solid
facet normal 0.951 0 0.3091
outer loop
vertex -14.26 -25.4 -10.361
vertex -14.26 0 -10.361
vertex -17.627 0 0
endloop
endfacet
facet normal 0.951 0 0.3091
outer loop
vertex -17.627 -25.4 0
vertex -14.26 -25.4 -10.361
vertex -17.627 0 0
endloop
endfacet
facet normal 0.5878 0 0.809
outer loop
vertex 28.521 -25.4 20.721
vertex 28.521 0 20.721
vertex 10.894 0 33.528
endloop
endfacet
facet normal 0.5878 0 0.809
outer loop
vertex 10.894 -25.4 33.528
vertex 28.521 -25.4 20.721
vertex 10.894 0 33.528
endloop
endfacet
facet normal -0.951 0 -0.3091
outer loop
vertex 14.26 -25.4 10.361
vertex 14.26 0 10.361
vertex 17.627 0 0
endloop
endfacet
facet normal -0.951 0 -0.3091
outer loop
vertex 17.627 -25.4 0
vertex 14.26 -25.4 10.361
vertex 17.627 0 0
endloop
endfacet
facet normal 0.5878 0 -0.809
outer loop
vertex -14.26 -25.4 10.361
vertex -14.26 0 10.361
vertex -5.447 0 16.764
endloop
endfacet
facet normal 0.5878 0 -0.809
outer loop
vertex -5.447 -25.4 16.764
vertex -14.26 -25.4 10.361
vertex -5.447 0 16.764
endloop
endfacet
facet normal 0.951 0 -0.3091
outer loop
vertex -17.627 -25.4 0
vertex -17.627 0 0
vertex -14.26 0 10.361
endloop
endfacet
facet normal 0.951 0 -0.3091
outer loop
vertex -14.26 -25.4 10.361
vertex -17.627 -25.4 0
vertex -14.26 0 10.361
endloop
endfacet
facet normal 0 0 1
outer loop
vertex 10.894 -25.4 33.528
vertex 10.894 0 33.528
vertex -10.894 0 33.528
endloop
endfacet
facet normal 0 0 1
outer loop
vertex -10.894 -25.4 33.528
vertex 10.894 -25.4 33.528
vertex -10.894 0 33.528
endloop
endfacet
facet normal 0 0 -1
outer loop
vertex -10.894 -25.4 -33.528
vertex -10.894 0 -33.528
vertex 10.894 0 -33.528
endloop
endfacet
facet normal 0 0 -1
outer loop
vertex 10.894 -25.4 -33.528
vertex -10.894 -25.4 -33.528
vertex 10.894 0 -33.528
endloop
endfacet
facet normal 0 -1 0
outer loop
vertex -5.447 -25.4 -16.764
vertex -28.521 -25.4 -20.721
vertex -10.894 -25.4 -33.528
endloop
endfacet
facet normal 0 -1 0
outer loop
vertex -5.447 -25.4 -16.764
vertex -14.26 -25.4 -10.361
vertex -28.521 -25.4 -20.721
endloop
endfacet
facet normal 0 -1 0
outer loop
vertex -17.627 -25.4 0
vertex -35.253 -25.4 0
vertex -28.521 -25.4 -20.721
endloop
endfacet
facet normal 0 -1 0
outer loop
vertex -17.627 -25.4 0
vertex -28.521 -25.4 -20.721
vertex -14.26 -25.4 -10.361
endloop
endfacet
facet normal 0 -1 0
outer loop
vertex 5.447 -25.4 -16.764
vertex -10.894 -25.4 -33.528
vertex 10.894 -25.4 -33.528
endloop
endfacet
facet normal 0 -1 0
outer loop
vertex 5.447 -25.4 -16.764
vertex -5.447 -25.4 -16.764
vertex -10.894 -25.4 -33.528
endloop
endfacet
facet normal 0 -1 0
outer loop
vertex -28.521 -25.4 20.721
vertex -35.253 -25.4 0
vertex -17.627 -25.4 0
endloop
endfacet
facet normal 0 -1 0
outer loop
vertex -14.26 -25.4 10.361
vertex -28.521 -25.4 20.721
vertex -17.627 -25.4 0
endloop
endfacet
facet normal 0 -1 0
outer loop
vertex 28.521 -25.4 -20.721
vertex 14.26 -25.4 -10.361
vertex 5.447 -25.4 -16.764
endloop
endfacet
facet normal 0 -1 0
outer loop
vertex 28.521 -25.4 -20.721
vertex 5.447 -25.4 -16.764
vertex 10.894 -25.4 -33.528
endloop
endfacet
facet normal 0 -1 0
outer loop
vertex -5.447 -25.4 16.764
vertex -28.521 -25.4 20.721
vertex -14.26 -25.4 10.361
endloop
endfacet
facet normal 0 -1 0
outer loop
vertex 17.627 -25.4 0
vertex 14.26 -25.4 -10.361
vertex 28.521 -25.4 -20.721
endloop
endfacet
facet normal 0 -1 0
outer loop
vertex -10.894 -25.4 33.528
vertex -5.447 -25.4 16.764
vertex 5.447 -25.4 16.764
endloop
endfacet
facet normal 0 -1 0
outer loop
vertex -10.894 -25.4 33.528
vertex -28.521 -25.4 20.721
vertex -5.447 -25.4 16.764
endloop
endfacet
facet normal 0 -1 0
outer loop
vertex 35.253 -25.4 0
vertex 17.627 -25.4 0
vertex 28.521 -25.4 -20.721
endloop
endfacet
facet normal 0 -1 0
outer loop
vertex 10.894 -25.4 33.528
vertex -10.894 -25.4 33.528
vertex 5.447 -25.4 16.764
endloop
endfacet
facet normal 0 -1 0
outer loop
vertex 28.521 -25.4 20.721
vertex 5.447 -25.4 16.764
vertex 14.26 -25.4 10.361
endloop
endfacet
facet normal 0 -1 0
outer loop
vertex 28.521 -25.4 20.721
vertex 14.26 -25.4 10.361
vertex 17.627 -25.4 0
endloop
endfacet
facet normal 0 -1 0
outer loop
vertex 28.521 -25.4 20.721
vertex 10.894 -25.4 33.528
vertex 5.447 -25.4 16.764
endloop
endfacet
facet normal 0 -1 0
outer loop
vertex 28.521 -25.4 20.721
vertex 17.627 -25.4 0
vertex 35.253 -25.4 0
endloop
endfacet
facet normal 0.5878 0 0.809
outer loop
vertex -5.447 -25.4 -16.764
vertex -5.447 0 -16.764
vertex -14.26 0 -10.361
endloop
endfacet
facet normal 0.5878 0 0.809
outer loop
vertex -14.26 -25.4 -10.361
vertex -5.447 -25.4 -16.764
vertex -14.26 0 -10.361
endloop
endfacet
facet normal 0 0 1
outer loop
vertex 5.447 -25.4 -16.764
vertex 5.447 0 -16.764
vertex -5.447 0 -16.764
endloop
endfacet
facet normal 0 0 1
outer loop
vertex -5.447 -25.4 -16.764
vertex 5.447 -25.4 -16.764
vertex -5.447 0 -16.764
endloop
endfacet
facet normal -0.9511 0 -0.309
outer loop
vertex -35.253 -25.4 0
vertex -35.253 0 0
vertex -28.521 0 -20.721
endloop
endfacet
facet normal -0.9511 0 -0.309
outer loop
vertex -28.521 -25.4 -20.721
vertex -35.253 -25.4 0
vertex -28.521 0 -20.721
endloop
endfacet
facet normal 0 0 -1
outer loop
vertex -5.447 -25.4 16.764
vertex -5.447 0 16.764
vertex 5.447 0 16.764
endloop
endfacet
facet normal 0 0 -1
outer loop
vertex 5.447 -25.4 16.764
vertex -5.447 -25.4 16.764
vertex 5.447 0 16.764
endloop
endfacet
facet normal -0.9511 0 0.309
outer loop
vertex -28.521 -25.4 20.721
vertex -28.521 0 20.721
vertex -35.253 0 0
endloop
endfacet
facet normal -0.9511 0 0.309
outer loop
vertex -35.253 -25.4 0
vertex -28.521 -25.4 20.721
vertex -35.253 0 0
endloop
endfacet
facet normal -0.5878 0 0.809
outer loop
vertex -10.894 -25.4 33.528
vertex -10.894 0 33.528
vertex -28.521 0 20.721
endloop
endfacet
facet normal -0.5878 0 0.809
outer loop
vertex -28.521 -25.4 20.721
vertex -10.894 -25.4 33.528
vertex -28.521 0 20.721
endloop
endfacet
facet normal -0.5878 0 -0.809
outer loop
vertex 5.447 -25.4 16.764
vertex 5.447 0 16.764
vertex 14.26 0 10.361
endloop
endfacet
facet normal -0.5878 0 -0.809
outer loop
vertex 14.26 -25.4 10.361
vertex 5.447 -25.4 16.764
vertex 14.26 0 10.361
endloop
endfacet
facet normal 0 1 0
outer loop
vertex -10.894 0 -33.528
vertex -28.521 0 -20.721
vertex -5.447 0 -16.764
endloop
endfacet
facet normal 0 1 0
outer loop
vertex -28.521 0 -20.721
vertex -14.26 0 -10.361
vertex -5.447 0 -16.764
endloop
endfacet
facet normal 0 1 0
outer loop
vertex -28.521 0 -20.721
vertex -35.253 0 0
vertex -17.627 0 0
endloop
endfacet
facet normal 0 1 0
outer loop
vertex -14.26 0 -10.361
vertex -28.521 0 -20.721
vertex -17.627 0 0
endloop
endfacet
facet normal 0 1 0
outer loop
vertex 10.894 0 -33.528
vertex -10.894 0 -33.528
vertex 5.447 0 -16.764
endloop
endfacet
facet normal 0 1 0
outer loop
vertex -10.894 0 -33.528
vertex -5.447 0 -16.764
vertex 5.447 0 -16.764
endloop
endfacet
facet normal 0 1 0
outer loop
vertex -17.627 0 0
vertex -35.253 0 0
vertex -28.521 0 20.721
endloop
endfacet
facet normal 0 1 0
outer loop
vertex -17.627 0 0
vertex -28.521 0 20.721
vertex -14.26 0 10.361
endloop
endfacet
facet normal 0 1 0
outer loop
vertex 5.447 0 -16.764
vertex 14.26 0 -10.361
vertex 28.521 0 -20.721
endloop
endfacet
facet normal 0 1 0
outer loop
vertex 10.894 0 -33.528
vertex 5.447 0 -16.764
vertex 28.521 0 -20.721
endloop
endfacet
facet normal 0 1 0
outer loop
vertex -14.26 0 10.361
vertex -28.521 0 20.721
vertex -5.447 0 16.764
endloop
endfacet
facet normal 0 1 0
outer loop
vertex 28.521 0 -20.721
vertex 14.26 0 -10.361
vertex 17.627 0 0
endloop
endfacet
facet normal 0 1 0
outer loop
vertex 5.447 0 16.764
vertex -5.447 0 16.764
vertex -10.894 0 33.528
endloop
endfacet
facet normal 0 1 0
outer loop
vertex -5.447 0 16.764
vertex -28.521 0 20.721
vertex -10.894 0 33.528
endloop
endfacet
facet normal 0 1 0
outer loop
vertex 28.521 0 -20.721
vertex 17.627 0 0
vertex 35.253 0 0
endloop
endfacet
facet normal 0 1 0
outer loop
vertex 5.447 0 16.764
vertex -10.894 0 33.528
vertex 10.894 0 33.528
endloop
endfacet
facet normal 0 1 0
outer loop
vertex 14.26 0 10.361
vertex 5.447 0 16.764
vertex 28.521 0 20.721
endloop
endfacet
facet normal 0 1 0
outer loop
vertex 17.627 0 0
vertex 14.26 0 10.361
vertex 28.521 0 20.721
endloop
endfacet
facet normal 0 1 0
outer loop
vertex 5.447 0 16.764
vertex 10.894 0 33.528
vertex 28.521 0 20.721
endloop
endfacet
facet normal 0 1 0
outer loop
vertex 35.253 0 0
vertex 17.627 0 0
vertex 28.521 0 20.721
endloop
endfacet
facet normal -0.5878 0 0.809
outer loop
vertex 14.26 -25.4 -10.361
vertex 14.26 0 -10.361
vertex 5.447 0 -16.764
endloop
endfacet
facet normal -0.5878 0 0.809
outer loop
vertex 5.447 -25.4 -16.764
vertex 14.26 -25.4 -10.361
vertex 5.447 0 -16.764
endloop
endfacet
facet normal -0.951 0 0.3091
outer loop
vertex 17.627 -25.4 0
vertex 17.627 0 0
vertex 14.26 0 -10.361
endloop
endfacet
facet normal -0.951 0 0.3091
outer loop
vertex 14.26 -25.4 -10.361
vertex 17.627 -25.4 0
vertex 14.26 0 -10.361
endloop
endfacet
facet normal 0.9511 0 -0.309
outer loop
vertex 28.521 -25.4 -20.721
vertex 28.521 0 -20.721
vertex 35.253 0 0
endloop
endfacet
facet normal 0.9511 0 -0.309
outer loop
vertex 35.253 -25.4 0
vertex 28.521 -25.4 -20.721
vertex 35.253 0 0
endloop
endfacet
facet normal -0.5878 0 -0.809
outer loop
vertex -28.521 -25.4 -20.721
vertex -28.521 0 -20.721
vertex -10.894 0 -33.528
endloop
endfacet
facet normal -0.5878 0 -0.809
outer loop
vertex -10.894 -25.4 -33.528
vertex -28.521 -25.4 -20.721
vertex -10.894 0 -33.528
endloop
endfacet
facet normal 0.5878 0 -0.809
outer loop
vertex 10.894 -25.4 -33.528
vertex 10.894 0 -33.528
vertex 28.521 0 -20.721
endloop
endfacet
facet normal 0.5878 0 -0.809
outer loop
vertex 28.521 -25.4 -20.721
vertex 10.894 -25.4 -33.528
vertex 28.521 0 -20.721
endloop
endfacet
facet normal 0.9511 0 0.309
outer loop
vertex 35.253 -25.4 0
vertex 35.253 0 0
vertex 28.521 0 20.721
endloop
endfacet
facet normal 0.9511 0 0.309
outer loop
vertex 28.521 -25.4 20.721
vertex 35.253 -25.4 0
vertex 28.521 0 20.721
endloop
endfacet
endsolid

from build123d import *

# Parameters (mm, degrees)
F1_DEPTH = 25.4


with BuildPart() as f1:
    # F0 (on Front) → F1 (new body)
    with BuildSketch(Plane.XZ):
        Polygon((10.893908, 33.528), (0, 33.528), (-10.893908, 33.528), (-28.52062, 20.721444), (-35.253425, 0), (-28.52062, -20.721444), (-10.893908, -33.528), (10.893908, -33.528), (28.52062, -20.721444), (35.253425, 0), (28.52062, 20.721444), align=None)
        Polygon((-5.446954, 16.764), (0, 16.764), (5.446954, 16.764), (14.26031, 10.360722), (17.626713, 0), (14.26031, -10.360722), (5.446954, -16.764), (-5.446954, -16.764), (-14.26031, -10.360722), (-17.626713, 0), (-14.26031, 10.360722), align=None, mode=Mode.SUBTRACT)
    extrude(amount=F1_DEPTH)


solid = f1.part
